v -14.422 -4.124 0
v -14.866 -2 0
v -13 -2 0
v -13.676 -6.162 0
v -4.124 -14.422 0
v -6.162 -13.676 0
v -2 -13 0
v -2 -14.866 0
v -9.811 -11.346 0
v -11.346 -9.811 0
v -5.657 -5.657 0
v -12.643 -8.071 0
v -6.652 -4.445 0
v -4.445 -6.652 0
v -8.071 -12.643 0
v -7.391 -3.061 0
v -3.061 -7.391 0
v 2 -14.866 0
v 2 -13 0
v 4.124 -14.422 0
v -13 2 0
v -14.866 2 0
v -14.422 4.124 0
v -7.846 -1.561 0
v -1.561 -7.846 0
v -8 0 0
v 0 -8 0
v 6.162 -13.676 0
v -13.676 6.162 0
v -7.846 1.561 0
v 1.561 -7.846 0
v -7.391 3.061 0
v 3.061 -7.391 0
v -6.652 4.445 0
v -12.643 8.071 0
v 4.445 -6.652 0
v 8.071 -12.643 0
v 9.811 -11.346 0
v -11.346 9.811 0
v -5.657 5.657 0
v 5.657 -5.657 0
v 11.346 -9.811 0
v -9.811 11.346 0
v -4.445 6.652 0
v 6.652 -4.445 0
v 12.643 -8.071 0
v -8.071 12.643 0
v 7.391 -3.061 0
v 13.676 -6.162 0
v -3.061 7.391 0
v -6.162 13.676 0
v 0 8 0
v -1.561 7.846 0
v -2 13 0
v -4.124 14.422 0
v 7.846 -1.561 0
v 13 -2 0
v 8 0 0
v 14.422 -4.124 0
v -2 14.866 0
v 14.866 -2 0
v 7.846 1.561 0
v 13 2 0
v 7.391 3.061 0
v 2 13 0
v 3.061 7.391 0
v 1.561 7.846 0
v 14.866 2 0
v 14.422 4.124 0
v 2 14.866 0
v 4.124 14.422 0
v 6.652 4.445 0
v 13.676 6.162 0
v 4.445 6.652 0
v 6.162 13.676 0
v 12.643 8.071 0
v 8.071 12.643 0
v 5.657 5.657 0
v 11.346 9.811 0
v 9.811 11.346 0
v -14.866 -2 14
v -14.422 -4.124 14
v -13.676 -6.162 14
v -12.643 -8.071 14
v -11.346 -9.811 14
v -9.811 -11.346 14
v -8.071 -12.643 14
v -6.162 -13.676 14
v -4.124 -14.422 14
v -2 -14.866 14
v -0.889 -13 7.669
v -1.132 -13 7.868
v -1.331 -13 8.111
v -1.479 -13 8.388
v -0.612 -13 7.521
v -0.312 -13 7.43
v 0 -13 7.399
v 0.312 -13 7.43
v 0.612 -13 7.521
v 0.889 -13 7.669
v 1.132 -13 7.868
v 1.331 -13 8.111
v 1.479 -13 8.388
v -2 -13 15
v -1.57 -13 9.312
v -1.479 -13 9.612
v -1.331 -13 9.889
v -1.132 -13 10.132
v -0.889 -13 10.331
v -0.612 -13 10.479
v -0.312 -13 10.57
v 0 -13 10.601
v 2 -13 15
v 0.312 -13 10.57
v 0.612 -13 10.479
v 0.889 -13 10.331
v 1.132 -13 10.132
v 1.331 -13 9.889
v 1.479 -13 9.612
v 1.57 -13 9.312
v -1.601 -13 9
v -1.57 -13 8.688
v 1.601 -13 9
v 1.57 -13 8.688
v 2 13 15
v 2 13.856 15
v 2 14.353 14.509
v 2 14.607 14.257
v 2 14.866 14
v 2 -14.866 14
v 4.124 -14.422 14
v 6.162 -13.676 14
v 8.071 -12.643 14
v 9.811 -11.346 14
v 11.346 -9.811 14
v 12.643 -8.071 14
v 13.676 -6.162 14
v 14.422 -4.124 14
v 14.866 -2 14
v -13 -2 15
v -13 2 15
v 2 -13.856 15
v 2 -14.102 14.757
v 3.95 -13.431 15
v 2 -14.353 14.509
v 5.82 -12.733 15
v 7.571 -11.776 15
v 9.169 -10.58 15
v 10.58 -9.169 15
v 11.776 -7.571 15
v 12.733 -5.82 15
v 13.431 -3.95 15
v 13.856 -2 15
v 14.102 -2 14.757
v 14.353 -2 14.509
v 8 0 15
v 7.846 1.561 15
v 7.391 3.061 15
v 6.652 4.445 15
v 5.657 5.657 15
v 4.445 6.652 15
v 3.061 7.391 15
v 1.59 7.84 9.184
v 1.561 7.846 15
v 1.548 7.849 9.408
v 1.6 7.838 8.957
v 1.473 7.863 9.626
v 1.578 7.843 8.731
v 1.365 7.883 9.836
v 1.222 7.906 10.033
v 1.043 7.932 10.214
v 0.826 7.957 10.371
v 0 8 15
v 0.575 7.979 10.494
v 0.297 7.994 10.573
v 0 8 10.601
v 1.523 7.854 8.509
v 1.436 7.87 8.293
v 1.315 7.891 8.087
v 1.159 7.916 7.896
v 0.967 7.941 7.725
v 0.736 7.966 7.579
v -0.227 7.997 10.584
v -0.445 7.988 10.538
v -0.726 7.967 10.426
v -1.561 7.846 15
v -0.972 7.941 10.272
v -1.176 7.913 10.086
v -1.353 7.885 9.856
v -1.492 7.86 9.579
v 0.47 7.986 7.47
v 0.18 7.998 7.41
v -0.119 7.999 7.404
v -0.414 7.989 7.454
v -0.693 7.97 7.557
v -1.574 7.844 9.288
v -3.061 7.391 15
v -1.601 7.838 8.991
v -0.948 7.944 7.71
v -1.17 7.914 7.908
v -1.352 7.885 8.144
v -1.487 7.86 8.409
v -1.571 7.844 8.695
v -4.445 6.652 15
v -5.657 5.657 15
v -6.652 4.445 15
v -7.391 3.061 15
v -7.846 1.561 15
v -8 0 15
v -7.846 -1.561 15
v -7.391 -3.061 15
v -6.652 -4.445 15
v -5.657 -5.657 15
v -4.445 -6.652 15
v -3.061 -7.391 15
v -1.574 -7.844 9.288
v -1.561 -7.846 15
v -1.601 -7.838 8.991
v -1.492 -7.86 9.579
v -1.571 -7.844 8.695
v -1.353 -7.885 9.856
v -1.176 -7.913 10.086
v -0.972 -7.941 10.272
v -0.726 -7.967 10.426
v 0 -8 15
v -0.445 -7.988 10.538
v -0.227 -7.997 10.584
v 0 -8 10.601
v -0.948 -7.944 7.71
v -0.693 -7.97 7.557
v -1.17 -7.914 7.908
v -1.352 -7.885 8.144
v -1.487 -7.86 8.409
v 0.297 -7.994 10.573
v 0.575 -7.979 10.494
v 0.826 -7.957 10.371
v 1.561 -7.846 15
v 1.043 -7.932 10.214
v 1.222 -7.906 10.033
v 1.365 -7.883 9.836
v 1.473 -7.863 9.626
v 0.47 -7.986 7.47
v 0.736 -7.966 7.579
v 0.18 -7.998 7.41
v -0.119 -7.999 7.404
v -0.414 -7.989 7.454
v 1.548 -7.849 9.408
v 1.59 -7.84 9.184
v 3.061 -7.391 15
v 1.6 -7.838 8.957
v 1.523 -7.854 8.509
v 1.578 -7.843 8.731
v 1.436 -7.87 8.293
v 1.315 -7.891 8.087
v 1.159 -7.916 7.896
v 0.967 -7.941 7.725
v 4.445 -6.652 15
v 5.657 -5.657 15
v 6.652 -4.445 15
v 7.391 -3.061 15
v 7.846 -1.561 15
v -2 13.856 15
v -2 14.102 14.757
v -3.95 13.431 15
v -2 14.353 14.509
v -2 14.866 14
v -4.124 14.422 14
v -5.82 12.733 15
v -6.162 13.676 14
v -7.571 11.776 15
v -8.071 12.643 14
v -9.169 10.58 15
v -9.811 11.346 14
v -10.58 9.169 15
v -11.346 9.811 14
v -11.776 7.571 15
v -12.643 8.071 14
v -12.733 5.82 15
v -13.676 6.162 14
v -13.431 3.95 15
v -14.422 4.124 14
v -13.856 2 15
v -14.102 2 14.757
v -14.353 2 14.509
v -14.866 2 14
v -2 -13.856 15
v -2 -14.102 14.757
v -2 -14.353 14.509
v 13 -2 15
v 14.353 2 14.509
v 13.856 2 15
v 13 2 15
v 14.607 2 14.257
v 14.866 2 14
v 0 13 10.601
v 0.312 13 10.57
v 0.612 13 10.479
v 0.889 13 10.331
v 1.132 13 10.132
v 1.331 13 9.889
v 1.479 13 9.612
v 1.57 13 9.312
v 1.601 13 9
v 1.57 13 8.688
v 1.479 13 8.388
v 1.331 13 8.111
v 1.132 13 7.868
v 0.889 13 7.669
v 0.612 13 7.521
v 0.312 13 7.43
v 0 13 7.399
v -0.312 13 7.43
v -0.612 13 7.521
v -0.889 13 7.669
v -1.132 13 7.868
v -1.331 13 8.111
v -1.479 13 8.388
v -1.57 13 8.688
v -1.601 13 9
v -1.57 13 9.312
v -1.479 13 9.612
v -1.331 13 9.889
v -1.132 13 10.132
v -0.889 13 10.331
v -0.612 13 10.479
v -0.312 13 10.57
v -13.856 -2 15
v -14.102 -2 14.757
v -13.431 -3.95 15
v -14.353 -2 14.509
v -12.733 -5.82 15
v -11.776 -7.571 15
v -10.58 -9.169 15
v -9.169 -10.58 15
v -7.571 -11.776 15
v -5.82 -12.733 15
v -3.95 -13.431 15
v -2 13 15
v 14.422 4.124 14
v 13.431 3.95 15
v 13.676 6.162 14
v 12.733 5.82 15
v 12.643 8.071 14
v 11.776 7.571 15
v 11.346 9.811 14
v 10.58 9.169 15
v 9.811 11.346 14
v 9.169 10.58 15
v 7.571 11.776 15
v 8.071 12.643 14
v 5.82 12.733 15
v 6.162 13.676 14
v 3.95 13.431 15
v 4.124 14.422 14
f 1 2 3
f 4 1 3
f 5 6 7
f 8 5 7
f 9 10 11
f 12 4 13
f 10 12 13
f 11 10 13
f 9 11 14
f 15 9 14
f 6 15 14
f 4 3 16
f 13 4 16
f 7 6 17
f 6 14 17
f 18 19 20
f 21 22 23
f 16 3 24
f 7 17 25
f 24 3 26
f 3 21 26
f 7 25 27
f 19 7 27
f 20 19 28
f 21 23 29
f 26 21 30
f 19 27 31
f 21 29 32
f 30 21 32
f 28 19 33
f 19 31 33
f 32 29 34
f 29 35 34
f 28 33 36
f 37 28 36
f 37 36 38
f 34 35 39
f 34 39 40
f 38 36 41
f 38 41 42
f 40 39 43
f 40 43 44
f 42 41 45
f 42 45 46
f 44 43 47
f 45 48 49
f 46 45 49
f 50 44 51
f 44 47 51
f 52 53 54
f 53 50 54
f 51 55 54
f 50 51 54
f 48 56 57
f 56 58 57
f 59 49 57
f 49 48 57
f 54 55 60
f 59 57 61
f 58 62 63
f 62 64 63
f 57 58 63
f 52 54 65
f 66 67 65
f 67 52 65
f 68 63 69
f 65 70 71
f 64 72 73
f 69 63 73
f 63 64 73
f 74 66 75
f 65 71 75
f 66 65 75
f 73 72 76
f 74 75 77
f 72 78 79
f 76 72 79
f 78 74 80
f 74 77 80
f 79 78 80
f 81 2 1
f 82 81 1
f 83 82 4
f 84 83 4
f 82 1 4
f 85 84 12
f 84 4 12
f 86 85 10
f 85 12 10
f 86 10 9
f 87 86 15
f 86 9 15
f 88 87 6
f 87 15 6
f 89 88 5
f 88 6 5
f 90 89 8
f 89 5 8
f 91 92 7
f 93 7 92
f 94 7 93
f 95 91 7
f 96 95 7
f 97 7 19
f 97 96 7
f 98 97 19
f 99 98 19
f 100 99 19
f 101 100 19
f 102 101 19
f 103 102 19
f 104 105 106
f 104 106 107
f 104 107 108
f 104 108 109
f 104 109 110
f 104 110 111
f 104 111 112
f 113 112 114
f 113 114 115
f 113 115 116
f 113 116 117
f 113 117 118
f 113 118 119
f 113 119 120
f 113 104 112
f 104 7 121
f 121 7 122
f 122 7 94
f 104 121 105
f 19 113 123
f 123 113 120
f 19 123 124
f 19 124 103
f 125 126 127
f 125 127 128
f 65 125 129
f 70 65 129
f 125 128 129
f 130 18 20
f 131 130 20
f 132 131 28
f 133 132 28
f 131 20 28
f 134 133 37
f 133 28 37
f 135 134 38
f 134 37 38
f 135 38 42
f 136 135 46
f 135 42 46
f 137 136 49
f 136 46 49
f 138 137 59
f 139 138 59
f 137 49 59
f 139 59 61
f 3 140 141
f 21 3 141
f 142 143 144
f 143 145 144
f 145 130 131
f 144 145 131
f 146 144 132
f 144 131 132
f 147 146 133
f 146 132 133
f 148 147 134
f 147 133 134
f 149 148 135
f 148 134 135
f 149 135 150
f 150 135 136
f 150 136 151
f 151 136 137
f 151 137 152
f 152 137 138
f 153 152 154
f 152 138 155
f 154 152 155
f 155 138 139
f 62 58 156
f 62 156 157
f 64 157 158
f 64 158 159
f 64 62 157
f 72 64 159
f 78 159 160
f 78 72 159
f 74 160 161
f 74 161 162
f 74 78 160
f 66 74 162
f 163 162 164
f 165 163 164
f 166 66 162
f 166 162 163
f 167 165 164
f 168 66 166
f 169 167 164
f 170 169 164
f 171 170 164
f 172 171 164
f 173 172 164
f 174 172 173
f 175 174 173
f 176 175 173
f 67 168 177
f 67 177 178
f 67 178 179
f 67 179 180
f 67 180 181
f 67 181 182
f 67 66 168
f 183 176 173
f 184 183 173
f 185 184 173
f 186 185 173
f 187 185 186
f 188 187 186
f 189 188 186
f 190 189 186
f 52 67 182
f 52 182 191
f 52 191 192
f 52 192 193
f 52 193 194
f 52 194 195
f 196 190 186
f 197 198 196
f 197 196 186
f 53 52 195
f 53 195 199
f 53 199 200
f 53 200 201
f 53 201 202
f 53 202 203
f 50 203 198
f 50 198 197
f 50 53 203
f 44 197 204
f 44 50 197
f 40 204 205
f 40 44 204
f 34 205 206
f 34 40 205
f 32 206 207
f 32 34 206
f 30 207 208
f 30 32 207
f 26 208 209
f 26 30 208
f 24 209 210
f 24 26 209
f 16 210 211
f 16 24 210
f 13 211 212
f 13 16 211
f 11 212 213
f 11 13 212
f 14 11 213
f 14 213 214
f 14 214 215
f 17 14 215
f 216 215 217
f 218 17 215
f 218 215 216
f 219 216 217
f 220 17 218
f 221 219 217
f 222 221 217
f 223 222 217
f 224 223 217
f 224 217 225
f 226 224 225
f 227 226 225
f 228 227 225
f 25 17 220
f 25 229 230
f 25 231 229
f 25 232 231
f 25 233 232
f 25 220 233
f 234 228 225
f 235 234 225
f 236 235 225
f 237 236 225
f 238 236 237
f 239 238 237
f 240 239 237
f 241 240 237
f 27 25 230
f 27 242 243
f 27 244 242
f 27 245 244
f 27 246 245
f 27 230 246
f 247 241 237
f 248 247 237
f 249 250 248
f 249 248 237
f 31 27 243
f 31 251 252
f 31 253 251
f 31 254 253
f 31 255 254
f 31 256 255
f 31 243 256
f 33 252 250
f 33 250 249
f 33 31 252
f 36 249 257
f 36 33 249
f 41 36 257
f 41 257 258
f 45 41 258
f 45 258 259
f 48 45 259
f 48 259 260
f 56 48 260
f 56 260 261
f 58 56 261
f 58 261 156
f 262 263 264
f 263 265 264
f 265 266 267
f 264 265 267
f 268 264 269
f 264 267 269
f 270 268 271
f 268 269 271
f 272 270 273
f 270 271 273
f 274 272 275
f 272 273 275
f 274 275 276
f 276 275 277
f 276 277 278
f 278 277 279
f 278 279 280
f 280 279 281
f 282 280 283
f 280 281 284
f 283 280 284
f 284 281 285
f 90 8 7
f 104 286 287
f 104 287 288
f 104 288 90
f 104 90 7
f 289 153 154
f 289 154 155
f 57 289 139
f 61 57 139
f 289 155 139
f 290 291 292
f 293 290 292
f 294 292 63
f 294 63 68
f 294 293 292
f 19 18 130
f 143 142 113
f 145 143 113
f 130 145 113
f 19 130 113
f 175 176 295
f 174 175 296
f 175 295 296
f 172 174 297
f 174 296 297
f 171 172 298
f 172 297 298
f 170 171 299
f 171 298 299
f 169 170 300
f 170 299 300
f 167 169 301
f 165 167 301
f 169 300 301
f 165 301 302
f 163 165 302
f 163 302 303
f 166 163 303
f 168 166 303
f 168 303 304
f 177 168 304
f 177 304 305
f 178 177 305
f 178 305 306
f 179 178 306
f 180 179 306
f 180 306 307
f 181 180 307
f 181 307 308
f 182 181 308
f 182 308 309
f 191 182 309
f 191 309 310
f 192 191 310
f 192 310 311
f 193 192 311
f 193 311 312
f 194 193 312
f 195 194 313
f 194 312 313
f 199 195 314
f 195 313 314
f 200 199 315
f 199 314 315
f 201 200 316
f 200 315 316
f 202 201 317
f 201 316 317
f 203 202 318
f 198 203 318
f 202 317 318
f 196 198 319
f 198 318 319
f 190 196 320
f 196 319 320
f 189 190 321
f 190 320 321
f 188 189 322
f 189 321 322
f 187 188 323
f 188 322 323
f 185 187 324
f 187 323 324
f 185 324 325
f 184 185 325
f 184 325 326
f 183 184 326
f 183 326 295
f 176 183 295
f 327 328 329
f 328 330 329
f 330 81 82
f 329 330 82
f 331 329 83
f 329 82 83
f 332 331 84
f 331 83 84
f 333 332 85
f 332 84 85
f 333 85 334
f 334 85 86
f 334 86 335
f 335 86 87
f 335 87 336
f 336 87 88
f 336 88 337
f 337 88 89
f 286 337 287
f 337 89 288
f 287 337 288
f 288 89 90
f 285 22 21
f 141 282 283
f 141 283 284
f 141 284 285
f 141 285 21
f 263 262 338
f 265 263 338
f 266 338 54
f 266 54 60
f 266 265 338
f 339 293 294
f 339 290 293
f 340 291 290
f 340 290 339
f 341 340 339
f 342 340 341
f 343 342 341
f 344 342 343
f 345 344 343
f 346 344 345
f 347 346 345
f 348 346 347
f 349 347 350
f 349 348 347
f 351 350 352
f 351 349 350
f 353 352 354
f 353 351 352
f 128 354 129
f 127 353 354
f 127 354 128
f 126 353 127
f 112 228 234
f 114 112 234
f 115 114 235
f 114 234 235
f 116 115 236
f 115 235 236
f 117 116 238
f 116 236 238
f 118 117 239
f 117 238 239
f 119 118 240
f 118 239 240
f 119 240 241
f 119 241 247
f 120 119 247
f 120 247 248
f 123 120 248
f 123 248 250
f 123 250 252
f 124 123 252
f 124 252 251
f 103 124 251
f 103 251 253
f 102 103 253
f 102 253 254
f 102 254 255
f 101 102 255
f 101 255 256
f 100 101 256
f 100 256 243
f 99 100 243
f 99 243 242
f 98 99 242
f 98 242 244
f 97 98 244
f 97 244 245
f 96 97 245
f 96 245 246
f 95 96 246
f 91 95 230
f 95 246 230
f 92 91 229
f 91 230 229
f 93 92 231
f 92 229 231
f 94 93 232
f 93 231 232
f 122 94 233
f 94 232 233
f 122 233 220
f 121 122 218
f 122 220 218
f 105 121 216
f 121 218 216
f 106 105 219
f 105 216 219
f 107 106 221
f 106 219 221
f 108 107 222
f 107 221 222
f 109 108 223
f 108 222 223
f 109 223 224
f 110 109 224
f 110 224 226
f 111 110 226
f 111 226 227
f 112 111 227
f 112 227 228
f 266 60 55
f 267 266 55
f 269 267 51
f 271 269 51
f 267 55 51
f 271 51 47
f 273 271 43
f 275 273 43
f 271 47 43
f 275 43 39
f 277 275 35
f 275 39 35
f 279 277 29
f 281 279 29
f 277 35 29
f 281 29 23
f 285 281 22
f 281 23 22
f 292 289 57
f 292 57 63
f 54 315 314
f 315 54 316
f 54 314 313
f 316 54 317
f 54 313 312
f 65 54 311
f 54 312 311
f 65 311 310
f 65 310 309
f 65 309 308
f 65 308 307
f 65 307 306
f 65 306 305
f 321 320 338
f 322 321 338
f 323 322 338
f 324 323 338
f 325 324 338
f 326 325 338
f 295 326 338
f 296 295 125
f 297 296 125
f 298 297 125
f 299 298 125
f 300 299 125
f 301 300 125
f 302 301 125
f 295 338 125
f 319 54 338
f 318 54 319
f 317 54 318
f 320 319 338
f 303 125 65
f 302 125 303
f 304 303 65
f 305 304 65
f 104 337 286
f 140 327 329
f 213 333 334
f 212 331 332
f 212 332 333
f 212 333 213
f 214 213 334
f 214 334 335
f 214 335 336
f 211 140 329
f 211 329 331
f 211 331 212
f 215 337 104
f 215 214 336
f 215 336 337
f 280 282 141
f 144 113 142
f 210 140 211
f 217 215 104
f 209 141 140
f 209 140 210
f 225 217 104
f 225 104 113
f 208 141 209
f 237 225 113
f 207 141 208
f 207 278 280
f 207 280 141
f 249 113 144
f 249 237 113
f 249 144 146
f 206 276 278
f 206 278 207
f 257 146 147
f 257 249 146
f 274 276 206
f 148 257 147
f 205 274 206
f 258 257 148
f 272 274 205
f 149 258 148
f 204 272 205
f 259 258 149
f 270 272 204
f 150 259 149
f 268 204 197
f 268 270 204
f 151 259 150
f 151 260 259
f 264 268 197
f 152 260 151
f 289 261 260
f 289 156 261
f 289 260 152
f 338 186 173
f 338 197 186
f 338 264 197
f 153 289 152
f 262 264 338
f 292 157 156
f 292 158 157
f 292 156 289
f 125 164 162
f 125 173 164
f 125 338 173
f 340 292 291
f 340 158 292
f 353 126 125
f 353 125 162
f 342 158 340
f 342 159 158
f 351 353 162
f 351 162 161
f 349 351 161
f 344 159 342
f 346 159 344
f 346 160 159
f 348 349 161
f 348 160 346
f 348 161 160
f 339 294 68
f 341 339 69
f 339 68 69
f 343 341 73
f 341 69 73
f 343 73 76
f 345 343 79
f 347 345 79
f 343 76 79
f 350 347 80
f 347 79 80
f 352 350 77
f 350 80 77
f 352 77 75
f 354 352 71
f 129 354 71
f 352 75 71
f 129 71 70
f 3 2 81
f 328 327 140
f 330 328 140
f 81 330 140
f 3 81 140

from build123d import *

# Parameters (mm, degrees)
SKETCH1_R           = 15
SKETCH1_R_2         = 8
BOSS_EXTRUDE1_DEPTH = 15
SKETCH2_W           = 4
SKETCH2_H           = 4
CUT_EXTRUDE1_DEPTH  = 26.980762114
CHAMFER1_SIZE       = 1
SKETCH3_R           = 1.600526218
CUT_EXTRUDE2_DEPTH  = 35.964521839


with BuildPart() as part:
    # Sketch1 → Boss-Extrude1 (new body)
    with BuildSketch(Plane.XY):
        Circle(SKETCH1_R)
        Circle(SKETCH1_R_2, mode=Mode.SUBTRACT)
    extrude(amount=BOSS_EXTRUDE1_DEPTH)

    # Sketch2 → Cut-Extrude1 (cut, through all)
    with BuildSketch(Plane.XY.offset(15)):
        with Locations((15, 0)):
            Rectangle(SKETCH2_W, SKETCH2_H)
        with Locations((0, 15)):
            Rectangle(SKETCH2_W, SKETCH2_H)
        with Locations((0, -15)):
            Rectangle(SKETCH2_W, SKETCH2_H)
        with Locations((-15, 0)):
            Rectangle(SKETCH2_W, SKETCH2_H)
    extrude(amount=-CUT_EXTRUDE1_DEPTH, mode=Mode.SUBTRACT)

    # Chamfer1
    chamfer1_edges = [part.edges().sort_by_distance(p)[0] for p in [
        (-10.606601718, 10.606601718, 15),
        (-10.606601718, -10.606601718, 15),
        (10.606601718, -10.606601718, 15),
        (10.606601718, 10.606601718, 15),
    ]]
    chamfer(chamfer1_edges, length=CHAMFER1_SIZE)

    # Sketch3 → Cut-Extrude2 (cut, through all)
    with BuildSketch(Plane(origin=(0, 13, 0), x_dir=(1, 0, 0), z_dir=(0, 1, 0))):
        with Locations(Location((0, -9, 0), (0, 0, 270))):
            Circle(SKETCH3_R)
    extrude(amount=-CUT_EXTRUDE2_DEPTH, mode=Mode.SUBTRACT)


solid = part.part
